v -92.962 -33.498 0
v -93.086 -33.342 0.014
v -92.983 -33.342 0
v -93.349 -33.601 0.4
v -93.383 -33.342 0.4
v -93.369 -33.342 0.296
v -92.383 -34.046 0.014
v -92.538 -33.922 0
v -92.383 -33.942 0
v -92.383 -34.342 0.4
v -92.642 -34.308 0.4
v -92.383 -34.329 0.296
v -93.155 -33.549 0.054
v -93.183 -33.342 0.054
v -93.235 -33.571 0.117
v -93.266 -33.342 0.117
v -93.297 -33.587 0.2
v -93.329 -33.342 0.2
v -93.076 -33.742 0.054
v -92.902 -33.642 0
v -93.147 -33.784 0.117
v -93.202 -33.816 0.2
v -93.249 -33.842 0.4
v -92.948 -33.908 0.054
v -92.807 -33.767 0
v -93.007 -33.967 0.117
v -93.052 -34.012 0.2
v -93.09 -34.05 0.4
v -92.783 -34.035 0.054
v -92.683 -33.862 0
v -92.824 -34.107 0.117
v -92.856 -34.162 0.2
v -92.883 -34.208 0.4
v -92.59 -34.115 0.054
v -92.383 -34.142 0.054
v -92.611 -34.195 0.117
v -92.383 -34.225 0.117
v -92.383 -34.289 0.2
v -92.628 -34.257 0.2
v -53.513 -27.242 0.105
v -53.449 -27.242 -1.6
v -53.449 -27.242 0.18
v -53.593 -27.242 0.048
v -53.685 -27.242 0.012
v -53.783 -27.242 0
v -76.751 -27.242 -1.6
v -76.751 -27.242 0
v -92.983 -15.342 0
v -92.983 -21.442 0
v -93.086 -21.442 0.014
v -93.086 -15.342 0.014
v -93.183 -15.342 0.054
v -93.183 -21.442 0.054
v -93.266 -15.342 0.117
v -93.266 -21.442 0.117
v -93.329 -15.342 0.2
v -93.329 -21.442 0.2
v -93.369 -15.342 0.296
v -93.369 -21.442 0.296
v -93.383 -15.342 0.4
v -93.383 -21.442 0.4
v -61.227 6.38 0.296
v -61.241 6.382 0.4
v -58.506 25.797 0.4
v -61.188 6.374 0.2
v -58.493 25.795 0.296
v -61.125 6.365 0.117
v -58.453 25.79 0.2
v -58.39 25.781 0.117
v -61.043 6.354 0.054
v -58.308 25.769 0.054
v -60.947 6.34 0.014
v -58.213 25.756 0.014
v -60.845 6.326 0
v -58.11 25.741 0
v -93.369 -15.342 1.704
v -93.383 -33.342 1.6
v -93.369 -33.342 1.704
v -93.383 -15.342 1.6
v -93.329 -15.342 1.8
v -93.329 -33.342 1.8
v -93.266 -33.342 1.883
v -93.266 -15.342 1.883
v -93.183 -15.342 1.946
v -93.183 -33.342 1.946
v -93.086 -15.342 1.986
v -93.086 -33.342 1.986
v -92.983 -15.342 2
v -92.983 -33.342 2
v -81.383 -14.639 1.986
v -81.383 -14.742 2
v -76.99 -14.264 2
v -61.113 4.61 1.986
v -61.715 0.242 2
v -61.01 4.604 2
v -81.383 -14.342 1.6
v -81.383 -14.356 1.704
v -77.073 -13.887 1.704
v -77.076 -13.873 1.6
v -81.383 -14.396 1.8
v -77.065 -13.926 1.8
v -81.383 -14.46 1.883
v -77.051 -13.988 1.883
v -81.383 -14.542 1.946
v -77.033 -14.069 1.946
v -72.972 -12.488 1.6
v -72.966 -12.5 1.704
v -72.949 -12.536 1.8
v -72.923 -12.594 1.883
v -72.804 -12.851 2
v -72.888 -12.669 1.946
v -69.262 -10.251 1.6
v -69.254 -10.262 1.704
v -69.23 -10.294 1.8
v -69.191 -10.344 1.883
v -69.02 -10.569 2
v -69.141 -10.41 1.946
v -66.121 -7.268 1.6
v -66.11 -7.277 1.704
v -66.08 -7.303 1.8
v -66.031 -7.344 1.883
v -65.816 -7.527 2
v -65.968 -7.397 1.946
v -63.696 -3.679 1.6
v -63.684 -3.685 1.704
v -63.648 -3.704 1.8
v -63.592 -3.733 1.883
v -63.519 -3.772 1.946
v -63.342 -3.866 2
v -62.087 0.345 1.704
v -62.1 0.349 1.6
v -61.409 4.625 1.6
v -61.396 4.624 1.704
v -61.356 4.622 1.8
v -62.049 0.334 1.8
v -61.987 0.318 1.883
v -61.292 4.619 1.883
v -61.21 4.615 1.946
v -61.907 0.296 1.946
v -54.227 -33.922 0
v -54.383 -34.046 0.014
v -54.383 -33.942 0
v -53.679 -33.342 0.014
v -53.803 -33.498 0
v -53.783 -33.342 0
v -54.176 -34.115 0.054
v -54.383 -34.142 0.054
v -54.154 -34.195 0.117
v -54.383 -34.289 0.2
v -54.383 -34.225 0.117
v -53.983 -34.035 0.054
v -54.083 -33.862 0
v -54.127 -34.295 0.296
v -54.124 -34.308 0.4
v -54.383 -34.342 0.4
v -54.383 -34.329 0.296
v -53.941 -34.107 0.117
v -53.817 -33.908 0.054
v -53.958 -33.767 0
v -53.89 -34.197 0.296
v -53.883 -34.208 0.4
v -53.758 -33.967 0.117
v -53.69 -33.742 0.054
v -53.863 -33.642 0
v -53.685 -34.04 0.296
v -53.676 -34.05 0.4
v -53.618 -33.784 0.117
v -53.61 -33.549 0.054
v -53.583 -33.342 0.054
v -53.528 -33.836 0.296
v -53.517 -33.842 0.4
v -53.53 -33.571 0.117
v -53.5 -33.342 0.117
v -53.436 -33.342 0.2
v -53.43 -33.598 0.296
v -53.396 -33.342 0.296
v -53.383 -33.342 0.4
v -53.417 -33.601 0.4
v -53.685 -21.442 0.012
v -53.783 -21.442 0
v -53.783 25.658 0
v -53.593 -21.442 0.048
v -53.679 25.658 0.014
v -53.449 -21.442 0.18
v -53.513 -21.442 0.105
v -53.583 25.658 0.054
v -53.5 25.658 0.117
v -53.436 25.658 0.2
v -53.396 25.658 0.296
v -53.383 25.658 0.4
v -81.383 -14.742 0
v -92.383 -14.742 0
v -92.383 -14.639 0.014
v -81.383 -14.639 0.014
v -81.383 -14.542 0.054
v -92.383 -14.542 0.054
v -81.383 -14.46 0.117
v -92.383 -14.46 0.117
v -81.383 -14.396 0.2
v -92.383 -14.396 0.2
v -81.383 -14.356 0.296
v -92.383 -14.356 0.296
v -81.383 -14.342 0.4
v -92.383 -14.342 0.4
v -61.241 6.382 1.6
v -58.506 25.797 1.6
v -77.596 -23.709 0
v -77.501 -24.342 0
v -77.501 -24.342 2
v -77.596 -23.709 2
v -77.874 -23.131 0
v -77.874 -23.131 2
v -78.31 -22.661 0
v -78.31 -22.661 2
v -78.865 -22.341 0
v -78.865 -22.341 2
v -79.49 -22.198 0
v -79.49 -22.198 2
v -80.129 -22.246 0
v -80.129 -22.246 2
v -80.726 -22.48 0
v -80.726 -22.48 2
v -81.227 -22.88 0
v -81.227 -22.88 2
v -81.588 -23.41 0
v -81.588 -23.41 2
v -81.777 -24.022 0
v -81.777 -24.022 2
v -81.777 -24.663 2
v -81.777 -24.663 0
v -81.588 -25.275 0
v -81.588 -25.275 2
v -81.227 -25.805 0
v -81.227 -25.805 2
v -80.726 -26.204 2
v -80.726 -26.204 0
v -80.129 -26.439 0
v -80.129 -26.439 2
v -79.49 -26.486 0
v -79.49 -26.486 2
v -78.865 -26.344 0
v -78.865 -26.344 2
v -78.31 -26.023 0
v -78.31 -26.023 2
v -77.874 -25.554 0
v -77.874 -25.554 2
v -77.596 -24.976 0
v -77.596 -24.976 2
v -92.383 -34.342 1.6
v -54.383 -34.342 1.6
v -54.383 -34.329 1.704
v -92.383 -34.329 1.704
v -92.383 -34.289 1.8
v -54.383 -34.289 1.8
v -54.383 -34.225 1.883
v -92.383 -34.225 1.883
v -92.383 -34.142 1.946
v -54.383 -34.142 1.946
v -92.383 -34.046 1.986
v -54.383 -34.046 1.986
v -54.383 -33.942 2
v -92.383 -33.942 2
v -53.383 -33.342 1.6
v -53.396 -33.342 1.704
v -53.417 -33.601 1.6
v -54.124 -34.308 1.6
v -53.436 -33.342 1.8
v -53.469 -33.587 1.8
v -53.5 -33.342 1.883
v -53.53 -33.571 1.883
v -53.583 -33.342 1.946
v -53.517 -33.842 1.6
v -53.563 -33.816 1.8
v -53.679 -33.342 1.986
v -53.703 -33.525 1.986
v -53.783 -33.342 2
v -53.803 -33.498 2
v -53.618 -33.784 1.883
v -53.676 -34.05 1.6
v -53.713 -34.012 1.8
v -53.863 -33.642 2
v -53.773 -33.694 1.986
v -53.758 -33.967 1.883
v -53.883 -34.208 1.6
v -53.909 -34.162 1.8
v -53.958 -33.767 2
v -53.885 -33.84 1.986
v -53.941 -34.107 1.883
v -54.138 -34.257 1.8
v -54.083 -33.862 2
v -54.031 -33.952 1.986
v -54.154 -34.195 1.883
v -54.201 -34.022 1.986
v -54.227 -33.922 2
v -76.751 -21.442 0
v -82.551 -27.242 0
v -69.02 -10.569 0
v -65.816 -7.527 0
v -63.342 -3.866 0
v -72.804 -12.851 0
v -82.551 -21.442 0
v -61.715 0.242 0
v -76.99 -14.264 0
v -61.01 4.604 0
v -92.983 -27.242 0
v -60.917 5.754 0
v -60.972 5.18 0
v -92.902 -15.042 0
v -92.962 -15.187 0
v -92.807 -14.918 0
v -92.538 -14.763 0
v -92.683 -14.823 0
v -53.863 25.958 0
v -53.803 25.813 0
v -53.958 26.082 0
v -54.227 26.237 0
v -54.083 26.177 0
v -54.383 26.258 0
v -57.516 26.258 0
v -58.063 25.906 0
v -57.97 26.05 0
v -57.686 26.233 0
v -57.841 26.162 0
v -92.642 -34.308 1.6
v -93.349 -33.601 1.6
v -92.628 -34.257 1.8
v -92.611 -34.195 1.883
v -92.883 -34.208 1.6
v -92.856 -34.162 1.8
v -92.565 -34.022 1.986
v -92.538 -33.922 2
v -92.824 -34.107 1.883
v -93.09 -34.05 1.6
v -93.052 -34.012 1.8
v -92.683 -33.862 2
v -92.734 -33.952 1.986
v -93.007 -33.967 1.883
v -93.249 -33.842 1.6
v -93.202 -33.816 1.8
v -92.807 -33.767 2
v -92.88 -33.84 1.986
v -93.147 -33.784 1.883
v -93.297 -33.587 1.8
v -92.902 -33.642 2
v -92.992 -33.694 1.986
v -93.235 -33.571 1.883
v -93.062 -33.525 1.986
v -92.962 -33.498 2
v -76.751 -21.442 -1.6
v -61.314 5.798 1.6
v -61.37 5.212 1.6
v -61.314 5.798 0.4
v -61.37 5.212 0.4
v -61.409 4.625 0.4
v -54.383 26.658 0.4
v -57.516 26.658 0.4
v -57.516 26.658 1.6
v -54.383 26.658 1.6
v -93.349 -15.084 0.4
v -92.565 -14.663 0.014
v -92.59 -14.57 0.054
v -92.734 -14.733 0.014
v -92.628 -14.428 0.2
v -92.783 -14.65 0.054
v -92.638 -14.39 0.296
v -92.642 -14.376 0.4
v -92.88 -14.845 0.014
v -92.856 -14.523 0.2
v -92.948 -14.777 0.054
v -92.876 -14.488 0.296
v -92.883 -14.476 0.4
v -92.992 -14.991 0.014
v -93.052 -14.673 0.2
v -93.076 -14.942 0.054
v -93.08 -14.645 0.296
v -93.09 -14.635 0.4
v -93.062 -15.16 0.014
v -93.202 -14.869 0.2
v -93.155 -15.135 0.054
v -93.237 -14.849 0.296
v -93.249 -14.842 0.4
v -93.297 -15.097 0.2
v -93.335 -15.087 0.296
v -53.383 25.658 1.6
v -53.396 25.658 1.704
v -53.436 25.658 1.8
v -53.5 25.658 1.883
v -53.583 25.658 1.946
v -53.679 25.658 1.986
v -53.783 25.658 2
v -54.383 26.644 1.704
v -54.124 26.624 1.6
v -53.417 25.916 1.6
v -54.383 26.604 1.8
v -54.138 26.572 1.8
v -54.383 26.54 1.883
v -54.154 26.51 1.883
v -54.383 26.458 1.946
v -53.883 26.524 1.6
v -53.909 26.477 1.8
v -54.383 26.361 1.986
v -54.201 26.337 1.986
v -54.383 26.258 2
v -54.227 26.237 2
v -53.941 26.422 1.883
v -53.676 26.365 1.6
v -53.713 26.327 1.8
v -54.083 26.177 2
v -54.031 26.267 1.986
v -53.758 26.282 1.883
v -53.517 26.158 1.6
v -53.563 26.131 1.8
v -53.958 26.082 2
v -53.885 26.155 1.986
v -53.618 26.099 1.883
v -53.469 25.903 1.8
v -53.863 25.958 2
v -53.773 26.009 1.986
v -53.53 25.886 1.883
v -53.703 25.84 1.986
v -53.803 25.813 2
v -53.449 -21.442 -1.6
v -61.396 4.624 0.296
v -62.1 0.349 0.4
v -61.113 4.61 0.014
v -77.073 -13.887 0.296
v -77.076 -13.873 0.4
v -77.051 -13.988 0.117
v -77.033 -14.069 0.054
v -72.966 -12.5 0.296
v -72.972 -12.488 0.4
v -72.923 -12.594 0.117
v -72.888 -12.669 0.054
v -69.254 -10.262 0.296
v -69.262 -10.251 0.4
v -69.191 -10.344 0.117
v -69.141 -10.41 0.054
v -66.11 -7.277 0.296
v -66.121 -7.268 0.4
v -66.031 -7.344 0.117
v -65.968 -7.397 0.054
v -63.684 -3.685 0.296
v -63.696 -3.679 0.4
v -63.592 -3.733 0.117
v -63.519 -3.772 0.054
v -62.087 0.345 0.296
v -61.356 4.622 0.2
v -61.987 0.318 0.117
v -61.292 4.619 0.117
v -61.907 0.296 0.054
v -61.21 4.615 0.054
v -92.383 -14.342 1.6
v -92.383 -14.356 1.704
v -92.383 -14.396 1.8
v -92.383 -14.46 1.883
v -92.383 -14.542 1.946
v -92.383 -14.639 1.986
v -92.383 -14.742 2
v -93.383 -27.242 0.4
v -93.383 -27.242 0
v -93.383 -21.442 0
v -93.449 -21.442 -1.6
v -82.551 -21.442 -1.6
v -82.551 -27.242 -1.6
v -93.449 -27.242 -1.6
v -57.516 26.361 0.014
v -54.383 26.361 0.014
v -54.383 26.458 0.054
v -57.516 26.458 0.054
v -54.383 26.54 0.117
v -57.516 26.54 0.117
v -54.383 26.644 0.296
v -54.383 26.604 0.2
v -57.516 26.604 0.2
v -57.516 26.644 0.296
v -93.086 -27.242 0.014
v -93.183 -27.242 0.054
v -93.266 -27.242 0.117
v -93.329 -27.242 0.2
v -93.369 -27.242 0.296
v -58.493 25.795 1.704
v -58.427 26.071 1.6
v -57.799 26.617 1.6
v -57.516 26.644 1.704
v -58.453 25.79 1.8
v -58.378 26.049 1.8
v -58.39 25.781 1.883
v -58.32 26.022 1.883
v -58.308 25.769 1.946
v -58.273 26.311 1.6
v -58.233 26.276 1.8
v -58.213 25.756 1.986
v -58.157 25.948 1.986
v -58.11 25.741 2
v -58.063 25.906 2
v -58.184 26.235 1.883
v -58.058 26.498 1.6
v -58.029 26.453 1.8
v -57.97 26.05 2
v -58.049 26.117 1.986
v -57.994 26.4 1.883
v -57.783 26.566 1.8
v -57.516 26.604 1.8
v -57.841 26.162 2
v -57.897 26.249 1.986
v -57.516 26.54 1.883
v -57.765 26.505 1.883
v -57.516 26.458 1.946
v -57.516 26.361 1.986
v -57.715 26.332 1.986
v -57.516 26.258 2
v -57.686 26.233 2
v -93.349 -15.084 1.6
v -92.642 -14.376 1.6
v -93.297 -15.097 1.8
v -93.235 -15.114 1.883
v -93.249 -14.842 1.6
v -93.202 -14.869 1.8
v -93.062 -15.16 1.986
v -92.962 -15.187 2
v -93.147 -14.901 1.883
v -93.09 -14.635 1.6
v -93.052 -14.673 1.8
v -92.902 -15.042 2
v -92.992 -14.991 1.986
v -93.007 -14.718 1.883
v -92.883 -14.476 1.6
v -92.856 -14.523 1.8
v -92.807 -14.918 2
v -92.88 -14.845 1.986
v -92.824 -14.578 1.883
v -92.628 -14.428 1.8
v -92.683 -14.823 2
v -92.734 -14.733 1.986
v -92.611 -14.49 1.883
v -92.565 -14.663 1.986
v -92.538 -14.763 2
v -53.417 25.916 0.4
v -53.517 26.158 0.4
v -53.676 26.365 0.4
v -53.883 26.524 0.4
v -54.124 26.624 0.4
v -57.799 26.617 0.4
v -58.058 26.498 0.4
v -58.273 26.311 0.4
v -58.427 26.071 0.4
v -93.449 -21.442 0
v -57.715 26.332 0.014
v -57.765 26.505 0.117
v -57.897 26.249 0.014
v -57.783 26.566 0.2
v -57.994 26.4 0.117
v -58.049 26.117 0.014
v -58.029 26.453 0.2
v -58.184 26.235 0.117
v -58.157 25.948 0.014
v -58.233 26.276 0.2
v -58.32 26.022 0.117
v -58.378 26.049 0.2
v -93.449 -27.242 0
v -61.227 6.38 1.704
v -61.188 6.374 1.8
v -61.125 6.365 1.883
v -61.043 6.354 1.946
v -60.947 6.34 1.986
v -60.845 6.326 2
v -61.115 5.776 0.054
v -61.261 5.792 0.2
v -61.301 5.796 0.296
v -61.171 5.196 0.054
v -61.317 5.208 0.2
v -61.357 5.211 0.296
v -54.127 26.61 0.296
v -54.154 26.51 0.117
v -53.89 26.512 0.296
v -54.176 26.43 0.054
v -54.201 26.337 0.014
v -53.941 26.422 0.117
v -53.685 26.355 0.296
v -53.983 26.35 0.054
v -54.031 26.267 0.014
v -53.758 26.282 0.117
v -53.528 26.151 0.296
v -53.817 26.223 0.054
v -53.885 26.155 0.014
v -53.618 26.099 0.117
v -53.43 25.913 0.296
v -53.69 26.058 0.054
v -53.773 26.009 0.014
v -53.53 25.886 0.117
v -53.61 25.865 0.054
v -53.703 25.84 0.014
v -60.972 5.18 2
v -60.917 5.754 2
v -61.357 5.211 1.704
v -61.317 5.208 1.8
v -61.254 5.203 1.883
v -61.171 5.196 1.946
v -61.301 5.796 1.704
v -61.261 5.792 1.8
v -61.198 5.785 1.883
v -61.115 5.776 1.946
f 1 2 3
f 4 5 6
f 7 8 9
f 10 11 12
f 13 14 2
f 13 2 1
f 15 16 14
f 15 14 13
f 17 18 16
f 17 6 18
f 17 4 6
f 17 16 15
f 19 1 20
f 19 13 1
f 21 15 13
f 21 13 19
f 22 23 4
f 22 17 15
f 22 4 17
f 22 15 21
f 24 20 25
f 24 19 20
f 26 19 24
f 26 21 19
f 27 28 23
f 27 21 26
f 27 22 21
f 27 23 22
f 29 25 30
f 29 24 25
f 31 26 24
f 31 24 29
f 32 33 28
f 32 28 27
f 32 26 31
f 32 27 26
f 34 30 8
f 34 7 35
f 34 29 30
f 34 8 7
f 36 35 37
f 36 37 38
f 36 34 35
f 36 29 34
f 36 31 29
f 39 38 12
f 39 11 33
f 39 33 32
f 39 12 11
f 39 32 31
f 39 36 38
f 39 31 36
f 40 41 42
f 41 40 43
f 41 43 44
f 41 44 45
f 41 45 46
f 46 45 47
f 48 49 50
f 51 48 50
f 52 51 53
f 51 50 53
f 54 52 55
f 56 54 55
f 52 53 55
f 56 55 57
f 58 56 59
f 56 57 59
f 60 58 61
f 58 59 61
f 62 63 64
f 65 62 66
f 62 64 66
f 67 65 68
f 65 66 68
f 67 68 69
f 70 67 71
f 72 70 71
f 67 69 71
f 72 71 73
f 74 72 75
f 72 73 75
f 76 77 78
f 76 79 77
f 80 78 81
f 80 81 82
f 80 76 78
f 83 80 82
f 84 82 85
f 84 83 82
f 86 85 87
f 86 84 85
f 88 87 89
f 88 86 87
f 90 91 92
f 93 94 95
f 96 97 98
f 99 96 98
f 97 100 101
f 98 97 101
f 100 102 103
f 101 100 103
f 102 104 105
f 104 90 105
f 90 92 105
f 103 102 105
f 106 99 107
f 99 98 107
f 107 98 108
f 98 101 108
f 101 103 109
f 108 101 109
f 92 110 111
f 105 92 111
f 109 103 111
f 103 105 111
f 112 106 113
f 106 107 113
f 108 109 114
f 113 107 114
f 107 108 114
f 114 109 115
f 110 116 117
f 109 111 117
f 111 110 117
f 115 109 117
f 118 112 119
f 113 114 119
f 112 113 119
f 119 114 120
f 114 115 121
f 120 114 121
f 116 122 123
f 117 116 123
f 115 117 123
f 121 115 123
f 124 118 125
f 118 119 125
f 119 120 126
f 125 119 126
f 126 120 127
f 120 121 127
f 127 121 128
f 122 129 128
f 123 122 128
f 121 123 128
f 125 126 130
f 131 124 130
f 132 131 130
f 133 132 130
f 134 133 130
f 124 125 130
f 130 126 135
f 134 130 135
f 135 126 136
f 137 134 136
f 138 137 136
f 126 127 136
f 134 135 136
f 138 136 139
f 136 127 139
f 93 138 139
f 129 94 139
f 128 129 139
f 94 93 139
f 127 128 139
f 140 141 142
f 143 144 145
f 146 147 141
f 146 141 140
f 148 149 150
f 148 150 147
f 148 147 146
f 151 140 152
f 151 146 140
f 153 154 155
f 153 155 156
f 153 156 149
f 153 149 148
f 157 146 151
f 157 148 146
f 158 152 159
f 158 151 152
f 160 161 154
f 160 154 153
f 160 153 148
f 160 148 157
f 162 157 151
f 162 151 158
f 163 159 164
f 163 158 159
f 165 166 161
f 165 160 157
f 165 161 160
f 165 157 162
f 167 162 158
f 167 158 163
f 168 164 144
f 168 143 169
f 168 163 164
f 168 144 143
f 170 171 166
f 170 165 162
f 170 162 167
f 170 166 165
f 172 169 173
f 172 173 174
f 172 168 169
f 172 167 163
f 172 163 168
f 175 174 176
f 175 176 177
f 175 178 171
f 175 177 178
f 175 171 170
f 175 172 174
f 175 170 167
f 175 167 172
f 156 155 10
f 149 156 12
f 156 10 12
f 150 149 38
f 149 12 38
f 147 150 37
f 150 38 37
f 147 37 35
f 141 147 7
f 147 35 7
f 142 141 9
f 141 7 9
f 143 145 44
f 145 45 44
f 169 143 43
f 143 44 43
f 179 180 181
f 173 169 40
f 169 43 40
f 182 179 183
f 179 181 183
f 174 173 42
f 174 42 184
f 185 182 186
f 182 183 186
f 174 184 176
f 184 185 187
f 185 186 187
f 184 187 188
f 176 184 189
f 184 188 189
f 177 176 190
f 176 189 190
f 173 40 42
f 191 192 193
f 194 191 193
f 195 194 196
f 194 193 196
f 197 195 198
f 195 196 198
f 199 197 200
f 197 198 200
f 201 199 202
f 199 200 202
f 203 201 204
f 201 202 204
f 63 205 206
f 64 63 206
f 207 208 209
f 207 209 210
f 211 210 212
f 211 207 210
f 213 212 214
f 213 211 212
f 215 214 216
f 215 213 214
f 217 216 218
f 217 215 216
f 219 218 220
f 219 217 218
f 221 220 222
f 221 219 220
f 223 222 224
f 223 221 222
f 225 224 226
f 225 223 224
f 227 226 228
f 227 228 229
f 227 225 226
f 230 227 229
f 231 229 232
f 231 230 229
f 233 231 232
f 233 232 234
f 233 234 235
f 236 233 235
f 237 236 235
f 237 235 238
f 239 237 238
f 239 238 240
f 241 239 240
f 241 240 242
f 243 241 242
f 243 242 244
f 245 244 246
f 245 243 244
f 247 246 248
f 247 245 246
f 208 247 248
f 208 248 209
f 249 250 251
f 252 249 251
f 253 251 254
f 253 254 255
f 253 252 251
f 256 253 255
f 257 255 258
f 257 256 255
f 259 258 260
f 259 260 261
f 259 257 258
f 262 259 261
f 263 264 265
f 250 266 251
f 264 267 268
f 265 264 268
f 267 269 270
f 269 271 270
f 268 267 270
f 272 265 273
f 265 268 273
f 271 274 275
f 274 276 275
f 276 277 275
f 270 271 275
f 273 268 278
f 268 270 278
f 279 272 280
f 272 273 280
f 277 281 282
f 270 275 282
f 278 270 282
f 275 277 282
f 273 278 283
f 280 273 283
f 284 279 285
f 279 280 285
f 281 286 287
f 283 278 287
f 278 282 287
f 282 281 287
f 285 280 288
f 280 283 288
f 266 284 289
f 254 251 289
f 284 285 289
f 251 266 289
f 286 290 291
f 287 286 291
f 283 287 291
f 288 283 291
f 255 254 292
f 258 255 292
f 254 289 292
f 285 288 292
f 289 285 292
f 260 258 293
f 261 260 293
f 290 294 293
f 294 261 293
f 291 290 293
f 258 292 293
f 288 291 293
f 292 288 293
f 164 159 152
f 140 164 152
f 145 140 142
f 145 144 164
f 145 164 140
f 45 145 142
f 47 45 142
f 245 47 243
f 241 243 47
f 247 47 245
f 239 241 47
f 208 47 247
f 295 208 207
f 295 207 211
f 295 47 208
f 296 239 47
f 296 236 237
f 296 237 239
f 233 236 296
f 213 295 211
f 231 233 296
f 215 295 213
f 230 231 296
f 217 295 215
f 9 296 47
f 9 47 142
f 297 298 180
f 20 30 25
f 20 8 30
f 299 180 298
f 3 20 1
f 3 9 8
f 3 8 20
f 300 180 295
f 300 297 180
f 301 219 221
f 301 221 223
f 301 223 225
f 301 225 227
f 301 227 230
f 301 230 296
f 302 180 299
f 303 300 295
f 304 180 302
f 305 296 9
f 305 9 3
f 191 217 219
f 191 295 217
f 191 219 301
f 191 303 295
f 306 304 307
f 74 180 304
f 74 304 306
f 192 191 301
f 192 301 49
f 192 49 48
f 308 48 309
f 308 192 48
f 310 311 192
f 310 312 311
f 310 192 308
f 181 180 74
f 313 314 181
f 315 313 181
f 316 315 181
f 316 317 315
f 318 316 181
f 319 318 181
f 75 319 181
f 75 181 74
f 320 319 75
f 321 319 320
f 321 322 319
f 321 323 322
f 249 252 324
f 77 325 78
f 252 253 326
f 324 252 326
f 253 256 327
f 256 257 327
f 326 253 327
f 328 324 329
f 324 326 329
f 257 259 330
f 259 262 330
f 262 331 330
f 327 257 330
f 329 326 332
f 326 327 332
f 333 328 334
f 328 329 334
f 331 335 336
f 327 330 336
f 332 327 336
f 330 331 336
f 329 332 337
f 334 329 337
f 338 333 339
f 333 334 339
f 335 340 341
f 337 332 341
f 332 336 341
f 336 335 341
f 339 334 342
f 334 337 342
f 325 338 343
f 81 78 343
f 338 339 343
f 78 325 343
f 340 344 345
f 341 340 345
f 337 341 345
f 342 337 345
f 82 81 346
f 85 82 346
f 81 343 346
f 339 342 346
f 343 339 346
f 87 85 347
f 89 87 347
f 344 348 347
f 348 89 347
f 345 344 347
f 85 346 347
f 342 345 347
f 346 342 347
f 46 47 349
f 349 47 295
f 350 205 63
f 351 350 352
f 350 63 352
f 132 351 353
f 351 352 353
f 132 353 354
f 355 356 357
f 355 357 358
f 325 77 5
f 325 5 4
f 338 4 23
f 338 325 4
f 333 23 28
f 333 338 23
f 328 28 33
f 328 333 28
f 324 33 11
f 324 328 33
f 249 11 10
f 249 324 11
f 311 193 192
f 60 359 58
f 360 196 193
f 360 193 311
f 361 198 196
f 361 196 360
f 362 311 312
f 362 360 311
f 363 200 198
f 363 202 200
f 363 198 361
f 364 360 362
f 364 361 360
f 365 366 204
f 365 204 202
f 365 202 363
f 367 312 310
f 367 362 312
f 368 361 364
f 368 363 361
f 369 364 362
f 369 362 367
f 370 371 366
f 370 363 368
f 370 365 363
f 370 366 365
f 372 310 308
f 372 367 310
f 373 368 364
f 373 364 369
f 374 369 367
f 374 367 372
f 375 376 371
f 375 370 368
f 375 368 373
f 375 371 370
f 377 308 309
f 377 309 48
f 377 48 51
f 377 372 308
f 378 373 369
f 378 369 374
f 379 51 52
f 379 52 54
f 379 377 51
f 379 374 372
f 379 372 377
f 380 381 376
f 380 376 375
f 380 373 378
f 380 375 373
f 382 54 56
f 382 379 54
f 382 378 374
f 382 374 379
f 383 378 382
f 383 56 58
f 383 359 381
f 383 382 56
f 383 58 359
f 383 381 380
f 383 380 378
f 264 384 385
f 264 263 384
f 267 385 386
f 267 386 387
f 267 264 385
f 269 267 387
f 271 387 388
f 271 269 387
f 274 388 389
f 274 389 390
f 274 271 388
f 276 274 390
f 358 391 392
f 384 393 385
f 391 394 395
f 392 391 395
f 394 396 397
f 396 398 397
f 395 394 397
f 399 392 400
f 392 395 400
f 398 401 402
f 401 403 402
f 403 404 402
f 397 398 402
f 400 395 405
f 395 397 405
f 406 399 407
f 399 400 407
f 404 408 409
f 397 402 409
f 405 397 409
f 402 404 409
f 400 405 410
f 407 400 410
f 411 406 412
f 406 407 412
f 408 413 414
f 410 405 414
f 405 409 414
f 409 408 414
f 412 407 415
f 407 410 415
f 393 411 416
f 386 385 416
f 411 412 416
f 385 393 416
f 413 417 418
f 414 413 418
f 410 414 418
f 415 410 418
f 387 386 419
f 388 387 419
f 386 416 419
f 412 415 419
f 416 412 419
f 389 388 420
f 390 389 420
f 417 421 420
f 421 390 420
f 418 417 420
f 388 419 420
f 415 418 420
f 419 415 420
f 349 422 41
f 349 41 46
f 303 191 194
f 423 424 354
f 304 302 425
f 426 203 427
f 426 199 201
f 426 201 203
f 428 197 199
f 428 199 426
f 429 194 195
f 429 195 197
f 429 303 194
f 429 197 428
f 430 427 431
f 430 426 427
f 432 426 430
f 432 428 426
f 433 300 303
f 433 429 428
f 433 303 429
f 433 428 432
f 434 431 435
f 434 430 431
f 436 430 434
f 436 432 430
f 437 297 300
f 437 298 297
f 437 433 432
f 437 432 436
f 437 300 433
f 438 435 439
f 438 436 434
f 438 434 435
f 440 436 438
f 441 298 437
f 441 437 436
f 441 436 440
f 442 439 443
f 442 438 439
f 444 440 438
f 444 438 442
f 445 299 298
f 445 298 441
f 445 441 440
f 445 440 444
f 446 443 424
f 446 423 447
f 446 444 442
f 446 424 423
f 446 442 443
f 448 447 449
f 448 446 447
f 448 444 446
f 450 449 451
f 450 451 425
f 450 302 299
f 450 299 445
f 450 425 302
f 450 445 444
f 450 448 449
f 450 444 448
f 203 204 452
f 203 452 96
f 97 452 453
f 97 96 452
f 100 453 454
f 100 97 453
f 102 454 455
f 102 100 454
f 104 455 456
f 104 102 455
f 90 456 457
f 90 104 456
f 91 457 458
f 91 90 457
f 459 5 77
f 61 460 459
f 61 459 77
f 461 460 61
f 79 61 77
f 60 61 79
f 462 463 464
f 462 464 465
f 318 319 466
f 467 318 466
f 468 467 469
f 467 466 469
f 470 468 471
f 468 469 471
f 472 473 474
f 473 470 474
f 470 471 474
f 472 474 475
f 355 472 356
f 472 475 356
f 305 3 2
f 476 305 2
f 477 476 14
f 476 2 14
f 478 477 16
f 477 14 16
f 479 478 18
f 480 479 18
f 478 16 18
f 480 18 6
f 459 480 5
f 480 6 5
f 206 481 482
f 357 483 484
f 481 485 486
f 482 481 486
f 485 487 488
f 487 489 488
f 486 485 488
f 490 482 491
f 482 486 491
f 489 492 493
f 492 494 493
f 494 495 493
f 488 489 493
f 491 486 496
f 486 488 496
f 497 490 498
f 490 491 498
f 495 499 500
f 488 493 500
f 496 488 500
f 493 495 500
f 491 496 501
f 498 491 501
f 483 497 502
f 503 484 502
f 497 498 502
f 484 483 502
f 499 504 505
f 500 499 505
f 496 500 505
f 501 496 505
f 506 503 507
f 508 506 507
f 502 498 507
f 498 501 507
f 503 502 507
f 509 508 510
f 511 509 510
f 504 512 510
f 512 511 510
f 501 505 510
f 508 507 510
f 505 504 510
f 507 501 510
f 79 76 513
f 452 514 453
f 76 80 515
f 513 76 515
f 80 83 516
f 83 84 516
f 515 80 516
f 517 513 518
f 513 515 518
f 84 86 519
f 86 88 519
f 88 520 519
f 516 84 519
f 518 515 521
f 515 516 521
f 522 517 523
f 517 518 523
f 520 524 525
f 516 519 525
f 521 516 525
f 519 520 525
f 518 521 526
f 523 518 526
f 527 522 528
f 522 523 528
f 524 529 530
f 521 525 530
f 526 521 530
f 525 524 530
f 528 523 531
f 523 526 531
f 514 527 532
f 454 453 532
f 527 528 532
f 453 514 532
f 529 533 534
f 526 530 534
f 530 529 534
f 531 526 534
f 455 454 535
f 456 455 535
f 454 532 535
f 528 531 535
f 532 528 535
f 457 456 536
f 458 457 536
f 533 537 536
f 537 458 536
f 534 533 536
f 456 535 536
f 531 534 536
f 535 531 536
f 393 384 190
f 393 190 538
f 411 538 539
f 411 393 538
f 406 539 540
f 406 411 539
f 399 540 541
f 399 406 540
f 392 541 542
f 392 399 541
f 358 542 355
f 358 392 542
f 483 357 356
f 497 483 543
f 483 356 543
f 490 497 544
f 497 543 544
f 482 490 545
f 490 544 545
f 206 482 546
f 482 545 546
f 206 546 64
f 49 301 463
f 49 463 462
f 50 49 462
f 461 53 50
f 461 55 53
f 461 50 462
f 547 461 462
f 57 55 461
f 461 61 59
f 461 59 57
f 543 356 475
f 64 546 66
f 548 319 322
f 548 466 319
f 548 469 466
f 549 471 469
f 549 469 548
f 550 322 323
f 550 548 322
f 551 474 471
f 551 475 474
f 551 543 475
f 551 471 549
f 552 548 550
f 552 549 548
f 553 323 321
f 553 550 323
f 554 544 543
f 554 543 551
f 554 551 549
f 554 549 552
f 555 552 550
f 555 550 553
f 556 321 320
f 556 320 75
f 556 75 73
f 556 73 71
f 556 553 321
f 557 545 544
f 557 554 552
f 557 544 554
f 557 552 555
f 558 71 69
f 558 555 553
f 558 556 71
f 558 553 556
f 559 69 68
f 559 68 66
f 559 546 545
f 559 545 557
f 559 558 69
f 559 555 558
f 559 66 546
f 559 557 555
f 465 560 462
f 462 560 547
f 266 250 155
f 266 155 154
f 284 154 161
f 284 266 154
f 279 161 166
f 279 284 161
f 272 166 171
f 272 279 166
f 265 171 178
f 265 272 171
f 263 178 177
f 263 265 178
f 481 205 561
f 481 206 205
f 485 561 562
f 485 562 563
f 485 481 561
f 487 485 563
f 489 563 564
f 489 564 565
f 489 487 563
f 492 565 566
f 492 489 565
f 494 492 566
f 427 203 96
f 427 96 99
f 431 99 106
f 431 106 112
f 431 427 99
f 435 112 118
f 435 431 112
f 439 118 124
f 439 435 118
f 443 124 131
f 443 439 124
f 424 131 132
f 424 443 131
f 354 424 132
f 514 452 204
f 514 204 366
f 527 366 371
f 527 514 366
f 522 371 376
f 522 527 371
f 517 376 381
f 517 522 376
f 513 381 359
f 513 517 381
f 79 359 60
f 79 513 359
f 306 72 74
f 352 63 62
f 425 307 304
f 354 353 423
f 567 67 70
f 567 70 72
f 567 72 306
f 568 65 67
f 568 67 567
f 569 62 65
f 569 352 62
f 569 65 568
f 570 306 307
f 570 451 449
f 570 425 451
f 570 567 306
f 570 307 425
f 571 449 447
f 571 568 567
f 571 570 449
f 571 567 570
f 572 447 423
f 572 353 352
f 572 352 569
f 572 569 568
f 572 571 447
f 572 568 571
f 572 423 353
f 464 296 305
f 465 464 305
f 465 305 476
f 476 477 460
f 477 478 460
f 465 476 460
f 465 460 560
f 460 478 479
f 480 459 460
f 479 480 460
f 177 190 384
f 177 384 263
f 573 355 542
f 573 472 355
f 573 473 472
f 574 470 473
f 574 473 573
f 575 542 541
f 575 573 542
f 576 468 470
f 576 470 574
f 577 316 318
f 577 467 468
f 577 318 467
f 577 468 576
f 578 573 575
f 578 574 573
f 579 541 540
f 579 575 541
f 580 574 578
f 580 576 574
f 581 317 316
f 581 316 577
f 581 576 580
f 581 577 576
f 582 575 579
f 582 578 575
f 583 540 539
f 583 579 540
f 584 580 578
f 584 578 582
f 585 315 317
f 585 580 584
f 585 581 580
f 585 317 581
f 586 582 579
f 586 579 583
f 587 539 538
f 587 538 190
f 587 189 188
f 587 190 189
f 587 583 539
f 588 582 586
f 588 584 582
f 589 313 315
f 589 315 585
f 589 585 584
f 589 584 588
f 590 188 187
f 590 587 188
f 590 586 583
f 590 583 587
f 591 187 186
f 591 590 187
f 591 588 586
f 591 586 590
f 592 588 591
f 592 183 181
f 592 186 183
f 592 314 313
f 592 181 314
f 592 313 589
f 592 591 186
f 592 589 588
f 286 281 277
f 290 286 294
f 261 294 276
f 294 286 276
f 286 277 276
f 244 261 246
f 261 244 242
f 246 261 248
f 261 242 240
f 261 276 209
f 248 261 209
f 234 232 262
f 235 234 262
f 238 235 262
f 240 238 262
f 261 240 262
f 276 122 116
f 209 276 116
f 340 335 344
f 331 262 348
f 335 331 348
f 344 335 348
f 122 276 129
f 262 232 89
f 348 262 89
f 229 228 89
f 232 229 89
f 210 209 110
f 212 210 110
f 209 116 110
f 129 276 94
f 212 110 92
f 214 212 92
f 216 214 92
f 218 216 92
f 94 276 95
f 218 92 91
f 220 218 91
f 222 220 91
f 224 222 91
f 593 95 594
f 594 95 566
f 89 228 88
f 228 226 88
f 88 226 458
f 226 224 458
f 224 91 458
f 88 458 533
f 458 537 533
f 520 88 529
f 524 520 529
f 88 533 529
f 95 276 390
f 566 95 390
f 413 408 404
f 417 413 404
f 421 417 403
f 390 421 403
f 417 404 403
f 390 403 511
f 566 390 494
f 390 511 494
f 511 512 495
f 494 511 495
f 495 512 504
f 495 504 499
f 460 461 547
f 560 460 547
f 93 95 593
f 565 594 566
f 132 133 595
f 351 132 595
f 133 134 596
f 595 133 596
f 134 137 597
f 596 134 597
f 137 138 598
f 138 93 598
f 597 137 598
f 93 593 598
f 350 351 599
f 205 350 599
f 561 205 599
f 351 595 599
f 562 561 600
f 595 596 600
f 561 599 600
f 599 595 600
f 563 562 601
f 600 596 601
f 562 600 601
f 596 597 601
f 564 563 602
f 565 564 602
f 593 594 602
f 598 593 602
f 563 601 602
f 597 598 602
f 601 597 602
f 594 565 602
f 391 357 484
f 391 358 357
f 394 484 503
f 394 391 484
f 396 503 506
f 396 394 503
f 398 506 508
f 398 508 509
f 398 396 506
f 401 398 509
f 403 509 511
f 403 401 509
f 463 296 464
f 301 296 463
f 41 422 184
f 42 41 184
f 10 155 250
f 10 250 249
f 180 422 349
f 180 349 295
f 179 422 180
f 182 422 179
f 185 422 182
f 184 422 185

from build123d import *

# Parameters (mm, degrees)
SKETCH_1_R          = 2.15
EXTRUDE_1_DEPTH     = 2
SKETCH_2_W          = 23.301883536
SKETCH_2_H          = 5.8
SKETCH_2_W_2        = 10.898116464
EXTRUDE_2_DEPTH     = 1.6
FILLET_1_R          = 1
CHAMFER_START       = -66
CHAMFER_1_OUTLINE_W = 25
CHAMFER_1_OUTLINE_H = 4
CHAMFER_1_DEPTH     = 4.467828672
FILLET_2_R          = 1
FILLET_3_R          = 20
FILLET_5_R          = 0.4
FILLET_6_R          = 0.4


with BuildPart() as part:
    # 草图1 → 凸台-拉伸1 (new body)
    with BuildSketch(Plane.XY):
        with BuildLine():
            Line((-61.382701422, 26.657582938), (-53.382701422, 26.657582938))
            Line((-53.382701422, 26.657582938), (-53.382701422, -34.342417062))
            Line((-53.382701422, -34.342417062), (-61.382701422, -34.342417062))
            Line((-61.382701422, -34.342417062), (-93.382701422, -34.342417062))
            Line((-93.382701422, -34.342417062), (-93.382701422, -14.342417062))
            Line((-93.382701422, -14.342417062), (-81.382701422, -14.342417062))
            ThreePointArc((-81.382701422, -14.342417062), (-67.240565798, -8.484552685), (-61.382701422, 5.657582938))
            Line((-61.382701422, 5.657582938), (-61.382701422, 26.657582938))
        make_face()
        with Locations((-79.650533319, -24.342417062)):
            Circle(SKETCH_1_R, mode=Mode.SUBTRACT)
    extrude(amount=EXTRUDE_1_DEPTH)

    # 草图2 → 凸台-拉伸2 (add)
    with BuildSketch(Plane(origin=(0, 0, 0), x_dir=(-1, 0, 0), z_dir=(0, 0, -1))):
        with Locations((65.099591551, -24.342417062)):
            Rectangle(SKETCH_2_W, SKETCH_2_H)
        with Locations((87.999591551, -24.342417062)):
            Rectangle(SKETCH_2_W_2, SKETCH_2_H)
    extrude(amount=EXTRUDE_2_DEPTH)

    # 圆角1
    fillet_1_edges = [part.edges().sort_by_distance(p)[0] for p in [
        (-53.382701422, 26.657582938, 1),
        (-53.382701422, -34.342417062, 1),
        (-93.382701422, -34.342417062, 1),
        (-93.382701422, -14.342417062, 1),
    ]]
    fillet(fillet_1_edges, radius=FILLET_1_R)

    # 倒角1: read off the stored shape, not the designer's step
    # 倒角1 outline → 倒角1 (cut)
    with BuildSketch(Plane(origin=(0, 0, 0), x_dir=(0.13944684527210205, 0.9902295579024383, 0), z_dir=(0.9902295579024384, -0.13944684527210205, 0)).offset(CHAMFER_START)):
        with Locations((7.5, 1)):
            Rectangle(CHAMFER_1_OUTLINE_W, CHAMFER_1_OUTLINE_H)
    extrude(amount=CHAMFER_1_DEPTH, mode=Mode.SUBTRACT)

    # 圆角2
    fillet_2_edges = [part.edges().sort_by_distance(p)[0] for p in [
        (-58.385305734, 26.657582938, 1),
    ]]
    fillet(fillet_2_edges, radius=FILLET_2_R)

    # 圆角3
    fillet_3_edges = [part.edges().sort_by_distance(p)[0] for p in [
        (-61.384966041, 5.356618447, 1),
    ]]
    fillet(fillet_3_edges, radius=FILLET_3_R)

    # 圆角5
    # the kernel refuses this fillet: 0.4 mm, written as the material it takes off along each edge
    with BuildSketch(Plane(origin=(-93.382701422, -21.442417062, 0), x_dir=(1, 0, 0), z_dir=(0, 1, 0)), Plane(origin=(-93.382701422, -33.342417062, 0), x_dir=(1, 0, 0), z_dir=(0, 1, 0))) as fillet_5_piece_1:
        with BuildLine():
            CenterArc((FILLET_5_R, -FILLET_5_R), FILLET_5_R, 90, 90)
            Line((0, -FILLET_5_R), (0, 0))
            Line((0, 0), (FILLET_5_R, 0))
        make_face()
    extrude(amount=6.1, mode=Mode.SUBTRACT)
    with BuildSketch(Plane(origin=(-92.382701422, -15.342417062, 0), x_dir=(0, 1, 0), z_dir=(1, 0, 0))) as fillet_5_piece_2:
        with BuildLine():
            CenterArc((1 - FILLET_5_R, FILLET_5_R), FILLET_5_R, 270, 90)
            Line((1, FILLET_5_R), (1, 0))
            Line((1, 0), (1 - FILLET_5_R, 0))
        make_face()
    revolve(axis=Axis((-92.382701422, -15.342417062, 0), (0, 0, 1)), revolution_arc=90, mode=Mode.SUBTRACT)
    with BuildSketch(Plane(origin=(-92.382701422, -14.342417062, 0), x_dir=(0, -1, 0), z_dir=(1, 0, 0))) as fillet_5_piece_3:
        with BuildLine():
            CenterArc((FILLET_5_R, -FILLET_5_R), FILLET_5_R, 90, 90)
            Line((0, -FILLET_5_R), (0, 0))
            Line((0, 0), (FILLET_5_R, 0))
        make_face()
    extrude(amount=11, mode=Mode.SUBTRACT)
    with BuildSketch(Plane(origin=(-81.382701422, 5.657582938, 0), x_dir=(0, -1, 0), z_dir=(-1, 0, 0))) as fillet_5_piece_4:
        with BuildLine():
            CenterArc((20 + FILLET_5_R, FILLET_5_R), FILLET_5_R, 180, 90)
            Line((20, FILLET_5_R), (20, 0))
            Line((20, 0), (20 + FILLET_5_R, 0))
        make_face()
    revolve(axis=Axis((-81.382701422, 5.657582938, 0), (0, 0, 1)), revolution_arc=87.040880974, mode=Mode.SUBTRACT)
    with BuildSketch(Plane(origin=(-92.382701422, -33.342417062, 0), x_dir=(-1, 0, 0), z_dir=(0, 1, 0))) as fillet_5_piece_5:
        with BuildLine():
            CenterArc((1 - FILLET_5_R, FILLET_5_R), FILLET_5_R, 270, 90)
            Line((1, FILLET_5_R), (1, 0))
            Line((1, 0), (1 - FILLET_5_R, 0))
        make_face()
    revolve(axis=Axis((-92.382701422, -33.342417062, 0), (0, 0, 1)), revolution_arc=90, mode=Mode.SUBTRACT)
    with BuildSketch(Plane(origin=(-92.382701422, -34.342417062, 0), x_dir=(0, 1, 0), z_dir=(1, 0, 0))) as fillet_5_piece_6:
        with BuildLine():
            CenterArc((FILLET_5_R, FILLET_5_R), FILLET_5_R, 180, 90)
            Line((0, FILLET_5_R), (0, 0))
            Line((0, 0), (FILLET_5_R, 0))
        make_face()
    extrude(amount=38, mode=Mode.SUBTRACT)
    with BuildSketch(Plane(origin=(-54.382701422, -33.342417062, 0), x_dir=(0, -1, 0), z_dir=(-1, 0, 0))) as fillet_5_piece_7:
        with BuildLine():
            CenterArc((1 - FILLET_5_R, FILLET_5_R), FILLET_5_R, 270, 90)
            Line((1, FILLET_5_R), (1, 0))
            Line((1, 0), (1 - FILLET_5_R, 0))
        make_face()
    revolve(axis=Axis((-54.382701422, -33.342417062, 0), (0, 0, 1)), revolution_arc=90, mode=Mode.SUBTRACT)
    with BuildSketch(Plane(origin=(-53.382701422, 25.657582938, 0), x_dir=(-1, 0, 0), z_dir=(0, -1, 0))) as fillet_5_piece_8_section:
        with BuildLine():
            CenterArc((FILLET_5_R, -FILLET_5_R), FILLET_5_R, 90, 90)
            Line((0, -FILLET_5_R), (0, 0))
            Line((0, 0), (FILLET_5_R, 0))
        make_face()
    fillet_5_piece_8 = extrude(amount=59, mode=Mode.PRIVATE)
    fillet_5_piece_8 = split(fillet_5_piece_8, bisect_by=Plane(origin=(-53.382701422, -21.442417062, 0), z_dir=(0, 1, 0)), keep=Keep.TOP, mode=Mode.PRIVATE)
    add(fillet_5_piece_8, mode=Mode.SUBTRACT)
    with BuildSketch(Plane(origin=(-53.382701422, 25.657582938, 0), x_dir=(-1, 0, 0), z_dir=(0, -1, 0))) as fillet_5_piece_9_section:
        with BuildLine():
            CenterArc((FILLET_5_R, -FILLET_5_R), FILLET_5_R, 90, 90)
            Line((0, -FILLET_5_R), (0, 0))
            Line((0, 0), (FILLET_5_R, 0))
        make_face()
    fillet_5_piece_9 = extrude(amount=59, mode=Mode.PRIVATE)
    fillet_5_piece_9 = split(fillet_5_piece_9, bisect_by=Plane(origin=(-53.448649783, 25.657582938, 0), z_dir=(1, 0, 0)), keep=Keep.TOP, mode=Mode.PRIVATE)
    add(fillet_5_piece_9, mode=Mode.SUBTRACT)
    with BuildSketch(Plane(origin=(-53.382701422, 25.657582938, 0), x_dir=(-1, 0, 0), z_dir=(0, -1, 0))) as fillet_5_piece_10_section:
        with BuildLine():
            CenterArc((FILLET_5_R, -FILLET_5_R), FILLET_5_R, 90, 90)
            Line((0, -FILLET_5_R), (0, 0))
            Line((0, 0), (FILLET_5_R, 0))
        make_face()
    fillet_5_piece_10 = extrude(amount=59, mode=Mode.PRIVATE)
    fillet_5_piece_10 = split(fillet_5_piece_10, bisect_by=Plane(origin=(-53.382701422, -27.242417062, 0), z_dir=(0, -1, 0)), keep=Keep.TOP, mode=Mode.PRIVATE)
    add(fillet_5_piece_10, mode=Mode.SUBTRACT)
    with BuildSketch(Plane(origin=(-54.382701422, 25.657582938, 0), x_dir=(0, 1, 0), z_dir=(-1, 0, 0))) as fillet_5_piece_11:
        with BuildLine():
            CenterArc((1 - FILLET_5_R, -FILLET_5_R), FILLET_5_R, 0, 90)
            Line((1, -FILLET_5_R), (1, 0))
            Line((1, 0), (1 - FILLET_5_R, 0))
        make_face()
    revolve(axis=Axis((-54.382701422, 25.657582938, 0), (0, 0, -1)), revolution_arc=90, mode=Mode.SUBTRACT)
    with BuildSketch(Plane(origin=(-57.516261634, 26.657582938, 0), x_dir=(0, -1, 0), z_dir=(1, 0, 0))) as fillet_5_piece_12:
        with BuildLine():
            CenterArc((FILLET_5_R, -FILLET_5_R), FILLET_5_R, 90, 90)
            Line((0, -FILLET_5_R), (0, 0))
            Line((0, 0), (FILLET_5_R, 0))
        make_face()
    extrude(amount=3.133560212, mode=Mode.SUBTRACT)
    with BuildSketch(Plane(origin=(-57.516261634, 25.657582938, 0), x_dir=(0, 1, 0), z_dir=(1, 0, 0))) as fillet_5_piece_13:
        with BuildLine():
            CenterArc((1 - FILLET_5_R, FILLET_5_R), FILLET_5_R, 270, 90)
            Line((1, FILLET_5_R), (1, 0))
            Line((1, 0), (1 - FILLET_5_R, 0))
        make_face()
    revolve(axis=Axis((-57.516261634, 25.657582938, 0), (0, 0, 1)), revolution_arc=81.984161159, mode=Mode.SUBTRACT)
    with BuildSketch(Plane(origin=(-58.506491192, 25.797029784, 0), x_dir=(0.9902295579024384, -0.13944684527210205, 0), z_dir=(-0.13944684527210205, -0.9902295579024384, 0))) as fillet_5_piece_14:
        with BuildLine():
            CenterArc((FILLET_5_R, FILLET_5_R), FILLET_5_R, 180, 90)
            Line((0, FILLET_5_R), (0, 0))
            Line((0, 0), (FILLET_5_R, 0))
        make_face()
    extrude(amount=19.60701568, mode=Mode.SUBTRACT)
    with BuildSketch(Plane(origin=(-41.436036516, 3.592646409, 0), x_dir=(-0.9902295579024383, 0.13944684527210185, 0), z_dir=(0.13944684527210185, 0.9902295579024383, 0))) as fillet_5_piece_15:
        with BuildLine():
            CenterArc((20 - FILLET_5_R, FILLET_5_R), FILLET_5_R, 270, 90)
            Line((20, FILLET_5_R), (20, 0))
            Line((20, 0), (20 - FILLET_5_R, 0))
        make_face()
    revolve(axis=Axis((-41.436036516, 3.592646409, 0), (0, 0, 1)), revolution_arc=5.056719815, mode=Mode.SUBTRACT)

    # 圆角6
    fillet_6_edges = [part.edges().sort_by_distance(p)[0] for p in [
        (-86.882701422, -14.342417062, 2),
        (-55.949481528, 26.657582938, 2),
        (-53.382701422, -3.842417062, 2),
        (-93.382701422, -24.342417062, 2),
        (-73.382701422, -34.342417062, 2),
        (-93.089808203, -14.63531028, 2),
        (-93.089808203, -34.049523843, 2),
        (-53.675594641, -34.049523843, 2),
        (-53.675594641, 26.36468972, 2),
        (-59.873559433, 16.089306549, 2),
        (-58.172216341, 26.412383192, 2),
        (-67.610435183, -8.844992097, 2),
        (-61.344378918, 5.505210859, 2),
    ]]
    fillet(fillet_6_edges, radius=FILLET_6_R)


solid = part.part
